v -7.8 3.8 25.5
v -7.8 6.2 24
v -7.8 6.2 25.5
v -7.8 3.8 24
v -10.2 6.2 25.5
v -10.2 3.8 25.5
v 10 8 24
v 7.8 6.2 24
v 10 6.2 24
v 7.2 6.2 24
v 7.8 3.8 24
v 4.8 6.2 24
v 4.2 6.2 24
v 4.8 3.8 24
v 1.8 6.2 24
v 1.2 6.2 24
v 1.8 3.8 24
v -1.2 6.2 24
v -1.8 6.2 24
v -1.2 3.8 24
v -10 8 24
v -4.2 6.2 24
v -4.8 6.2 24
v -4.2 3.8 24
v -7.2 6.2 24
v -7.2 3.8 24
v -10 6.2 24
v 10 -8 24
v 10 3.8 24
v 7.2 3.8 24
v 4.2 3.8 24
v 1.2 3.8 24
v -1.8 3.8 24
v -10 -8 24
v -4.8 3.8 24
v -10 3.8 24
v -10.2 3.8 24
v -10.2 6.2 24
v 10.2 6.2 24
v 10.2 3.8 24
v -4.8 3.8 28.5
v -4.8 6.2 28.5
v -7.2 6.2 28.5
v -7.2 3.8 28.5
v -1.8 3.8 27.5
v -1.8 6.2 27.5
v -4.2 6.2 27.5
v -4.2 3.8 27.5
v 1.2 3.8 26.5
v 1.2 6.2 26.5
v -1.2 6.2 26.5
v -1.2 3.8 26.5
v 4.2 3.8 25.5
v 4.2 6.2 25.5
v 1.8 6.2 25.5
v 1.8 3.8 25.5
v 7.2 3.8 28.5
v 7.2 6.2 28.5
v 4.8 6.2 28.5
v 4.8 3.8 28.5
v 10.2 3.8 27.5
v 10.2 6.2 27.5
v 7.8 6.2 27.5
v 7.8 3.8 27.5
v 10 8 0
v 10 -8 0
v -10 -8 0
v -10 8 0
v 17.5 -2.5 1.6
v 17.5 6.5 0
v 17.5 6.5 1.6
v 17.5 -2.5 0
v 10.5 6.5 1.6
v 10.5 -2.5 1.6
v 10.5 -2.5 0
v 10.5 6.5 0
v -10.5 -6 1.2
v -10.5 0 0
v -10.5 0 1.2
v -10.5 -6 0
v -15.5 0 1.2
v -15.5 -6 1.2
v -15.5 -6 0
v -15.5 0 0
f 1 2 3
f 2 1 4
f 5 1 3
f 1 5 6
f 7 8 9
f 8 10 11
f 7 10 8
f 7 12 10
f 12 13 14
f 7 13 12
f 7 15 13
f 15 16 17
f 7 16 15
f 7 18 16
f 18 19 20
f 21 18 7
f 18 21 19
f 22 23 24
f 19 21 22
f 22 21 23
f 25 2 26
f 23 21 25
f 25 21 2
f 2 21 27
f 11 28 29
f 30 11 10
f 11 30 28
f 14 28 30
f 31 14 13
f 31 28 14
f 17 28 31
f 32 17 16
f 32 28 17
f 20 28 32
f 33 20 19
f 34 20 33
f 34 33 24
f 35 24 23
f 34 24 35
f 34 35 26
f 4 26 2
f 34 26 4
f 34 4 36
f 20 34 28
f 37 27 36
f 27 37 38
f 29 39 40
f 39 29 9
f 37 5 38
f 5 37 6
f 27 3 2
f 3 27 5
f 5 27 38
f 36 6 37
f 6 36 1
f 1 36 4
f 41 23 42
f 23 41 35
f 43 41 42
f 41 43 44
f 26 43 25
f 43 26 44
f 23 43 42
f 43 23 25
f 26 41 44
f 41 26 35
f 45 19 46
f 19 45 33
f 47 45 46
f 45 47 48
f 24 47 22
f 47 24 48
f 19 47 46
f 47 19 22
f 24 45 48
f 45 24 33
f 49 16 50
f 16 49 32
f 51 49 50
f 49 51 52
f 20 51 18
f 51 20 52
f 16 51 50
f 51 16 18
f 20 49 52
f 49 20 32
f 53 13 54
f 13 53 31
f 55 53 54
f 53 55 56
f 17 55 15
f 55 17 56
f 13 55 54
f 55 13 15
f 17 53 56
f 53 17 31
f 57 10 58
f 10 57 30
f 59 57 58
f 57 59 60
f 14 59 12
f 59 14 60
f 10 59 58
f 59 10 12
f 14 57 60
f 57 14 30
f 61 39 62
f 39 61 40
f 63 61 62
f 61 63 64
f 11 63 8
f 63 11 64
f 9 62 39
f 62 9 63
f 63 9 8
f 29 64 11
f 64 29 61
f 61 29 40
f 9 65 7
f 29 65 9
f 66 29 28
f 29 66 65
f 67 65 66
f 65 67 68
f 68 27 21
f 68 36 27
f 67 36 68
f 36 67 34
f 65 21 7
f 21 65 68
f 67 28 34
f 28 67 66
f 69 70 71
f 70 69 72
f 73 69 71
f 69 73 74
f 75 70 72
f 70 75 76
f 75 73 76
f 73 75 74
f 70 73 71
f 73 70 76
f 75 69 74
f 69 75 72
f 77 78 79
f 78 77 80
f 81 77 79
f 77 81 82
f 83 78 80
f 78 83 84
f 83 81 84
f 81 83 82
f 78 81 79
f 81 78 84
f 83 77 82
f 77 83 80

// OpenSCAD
// 废墟楼 (battle_ruins) — 枪战战损建筑
// 残破楼体 + 参差不齐的破损顶 + 地面瓦砾
$fn = 6;

module ruins() {
  // 残破主楼体
  color([0.60, 0.57, 0.52]) translate([0, 0, 12]) cube([20, 16, 24], center = true);

  // 破损顶部（高低错落的小块模拟炸毁边缘）
  for (i = [0:3:18]) {
    hh = (i % 4) + 1.5;
    color([0.58, 0.55, 0.50]) translate([i - 9, 5, 24 + hh/2]) cube([2.4, 2.4, hh], center = true);
  }
  // 一侧塌掉一角的缺口（暗块表示空洞）
  color([0.30, 0.30, 0.30]) translate([8, -4, 16]) cube([4, 4, 12], center = true);
  // 地面瓦砾堆
  color([0.50, 0.48, 0.45]) translate([14, 2, 0.8]) cube([7, 9, 1.6], center = true);
  color([0.48, 0.46, 0.43]) translate([-13, -3, 0.6]) cube([5, 6, 1.2], center = true);
}

ruins();
